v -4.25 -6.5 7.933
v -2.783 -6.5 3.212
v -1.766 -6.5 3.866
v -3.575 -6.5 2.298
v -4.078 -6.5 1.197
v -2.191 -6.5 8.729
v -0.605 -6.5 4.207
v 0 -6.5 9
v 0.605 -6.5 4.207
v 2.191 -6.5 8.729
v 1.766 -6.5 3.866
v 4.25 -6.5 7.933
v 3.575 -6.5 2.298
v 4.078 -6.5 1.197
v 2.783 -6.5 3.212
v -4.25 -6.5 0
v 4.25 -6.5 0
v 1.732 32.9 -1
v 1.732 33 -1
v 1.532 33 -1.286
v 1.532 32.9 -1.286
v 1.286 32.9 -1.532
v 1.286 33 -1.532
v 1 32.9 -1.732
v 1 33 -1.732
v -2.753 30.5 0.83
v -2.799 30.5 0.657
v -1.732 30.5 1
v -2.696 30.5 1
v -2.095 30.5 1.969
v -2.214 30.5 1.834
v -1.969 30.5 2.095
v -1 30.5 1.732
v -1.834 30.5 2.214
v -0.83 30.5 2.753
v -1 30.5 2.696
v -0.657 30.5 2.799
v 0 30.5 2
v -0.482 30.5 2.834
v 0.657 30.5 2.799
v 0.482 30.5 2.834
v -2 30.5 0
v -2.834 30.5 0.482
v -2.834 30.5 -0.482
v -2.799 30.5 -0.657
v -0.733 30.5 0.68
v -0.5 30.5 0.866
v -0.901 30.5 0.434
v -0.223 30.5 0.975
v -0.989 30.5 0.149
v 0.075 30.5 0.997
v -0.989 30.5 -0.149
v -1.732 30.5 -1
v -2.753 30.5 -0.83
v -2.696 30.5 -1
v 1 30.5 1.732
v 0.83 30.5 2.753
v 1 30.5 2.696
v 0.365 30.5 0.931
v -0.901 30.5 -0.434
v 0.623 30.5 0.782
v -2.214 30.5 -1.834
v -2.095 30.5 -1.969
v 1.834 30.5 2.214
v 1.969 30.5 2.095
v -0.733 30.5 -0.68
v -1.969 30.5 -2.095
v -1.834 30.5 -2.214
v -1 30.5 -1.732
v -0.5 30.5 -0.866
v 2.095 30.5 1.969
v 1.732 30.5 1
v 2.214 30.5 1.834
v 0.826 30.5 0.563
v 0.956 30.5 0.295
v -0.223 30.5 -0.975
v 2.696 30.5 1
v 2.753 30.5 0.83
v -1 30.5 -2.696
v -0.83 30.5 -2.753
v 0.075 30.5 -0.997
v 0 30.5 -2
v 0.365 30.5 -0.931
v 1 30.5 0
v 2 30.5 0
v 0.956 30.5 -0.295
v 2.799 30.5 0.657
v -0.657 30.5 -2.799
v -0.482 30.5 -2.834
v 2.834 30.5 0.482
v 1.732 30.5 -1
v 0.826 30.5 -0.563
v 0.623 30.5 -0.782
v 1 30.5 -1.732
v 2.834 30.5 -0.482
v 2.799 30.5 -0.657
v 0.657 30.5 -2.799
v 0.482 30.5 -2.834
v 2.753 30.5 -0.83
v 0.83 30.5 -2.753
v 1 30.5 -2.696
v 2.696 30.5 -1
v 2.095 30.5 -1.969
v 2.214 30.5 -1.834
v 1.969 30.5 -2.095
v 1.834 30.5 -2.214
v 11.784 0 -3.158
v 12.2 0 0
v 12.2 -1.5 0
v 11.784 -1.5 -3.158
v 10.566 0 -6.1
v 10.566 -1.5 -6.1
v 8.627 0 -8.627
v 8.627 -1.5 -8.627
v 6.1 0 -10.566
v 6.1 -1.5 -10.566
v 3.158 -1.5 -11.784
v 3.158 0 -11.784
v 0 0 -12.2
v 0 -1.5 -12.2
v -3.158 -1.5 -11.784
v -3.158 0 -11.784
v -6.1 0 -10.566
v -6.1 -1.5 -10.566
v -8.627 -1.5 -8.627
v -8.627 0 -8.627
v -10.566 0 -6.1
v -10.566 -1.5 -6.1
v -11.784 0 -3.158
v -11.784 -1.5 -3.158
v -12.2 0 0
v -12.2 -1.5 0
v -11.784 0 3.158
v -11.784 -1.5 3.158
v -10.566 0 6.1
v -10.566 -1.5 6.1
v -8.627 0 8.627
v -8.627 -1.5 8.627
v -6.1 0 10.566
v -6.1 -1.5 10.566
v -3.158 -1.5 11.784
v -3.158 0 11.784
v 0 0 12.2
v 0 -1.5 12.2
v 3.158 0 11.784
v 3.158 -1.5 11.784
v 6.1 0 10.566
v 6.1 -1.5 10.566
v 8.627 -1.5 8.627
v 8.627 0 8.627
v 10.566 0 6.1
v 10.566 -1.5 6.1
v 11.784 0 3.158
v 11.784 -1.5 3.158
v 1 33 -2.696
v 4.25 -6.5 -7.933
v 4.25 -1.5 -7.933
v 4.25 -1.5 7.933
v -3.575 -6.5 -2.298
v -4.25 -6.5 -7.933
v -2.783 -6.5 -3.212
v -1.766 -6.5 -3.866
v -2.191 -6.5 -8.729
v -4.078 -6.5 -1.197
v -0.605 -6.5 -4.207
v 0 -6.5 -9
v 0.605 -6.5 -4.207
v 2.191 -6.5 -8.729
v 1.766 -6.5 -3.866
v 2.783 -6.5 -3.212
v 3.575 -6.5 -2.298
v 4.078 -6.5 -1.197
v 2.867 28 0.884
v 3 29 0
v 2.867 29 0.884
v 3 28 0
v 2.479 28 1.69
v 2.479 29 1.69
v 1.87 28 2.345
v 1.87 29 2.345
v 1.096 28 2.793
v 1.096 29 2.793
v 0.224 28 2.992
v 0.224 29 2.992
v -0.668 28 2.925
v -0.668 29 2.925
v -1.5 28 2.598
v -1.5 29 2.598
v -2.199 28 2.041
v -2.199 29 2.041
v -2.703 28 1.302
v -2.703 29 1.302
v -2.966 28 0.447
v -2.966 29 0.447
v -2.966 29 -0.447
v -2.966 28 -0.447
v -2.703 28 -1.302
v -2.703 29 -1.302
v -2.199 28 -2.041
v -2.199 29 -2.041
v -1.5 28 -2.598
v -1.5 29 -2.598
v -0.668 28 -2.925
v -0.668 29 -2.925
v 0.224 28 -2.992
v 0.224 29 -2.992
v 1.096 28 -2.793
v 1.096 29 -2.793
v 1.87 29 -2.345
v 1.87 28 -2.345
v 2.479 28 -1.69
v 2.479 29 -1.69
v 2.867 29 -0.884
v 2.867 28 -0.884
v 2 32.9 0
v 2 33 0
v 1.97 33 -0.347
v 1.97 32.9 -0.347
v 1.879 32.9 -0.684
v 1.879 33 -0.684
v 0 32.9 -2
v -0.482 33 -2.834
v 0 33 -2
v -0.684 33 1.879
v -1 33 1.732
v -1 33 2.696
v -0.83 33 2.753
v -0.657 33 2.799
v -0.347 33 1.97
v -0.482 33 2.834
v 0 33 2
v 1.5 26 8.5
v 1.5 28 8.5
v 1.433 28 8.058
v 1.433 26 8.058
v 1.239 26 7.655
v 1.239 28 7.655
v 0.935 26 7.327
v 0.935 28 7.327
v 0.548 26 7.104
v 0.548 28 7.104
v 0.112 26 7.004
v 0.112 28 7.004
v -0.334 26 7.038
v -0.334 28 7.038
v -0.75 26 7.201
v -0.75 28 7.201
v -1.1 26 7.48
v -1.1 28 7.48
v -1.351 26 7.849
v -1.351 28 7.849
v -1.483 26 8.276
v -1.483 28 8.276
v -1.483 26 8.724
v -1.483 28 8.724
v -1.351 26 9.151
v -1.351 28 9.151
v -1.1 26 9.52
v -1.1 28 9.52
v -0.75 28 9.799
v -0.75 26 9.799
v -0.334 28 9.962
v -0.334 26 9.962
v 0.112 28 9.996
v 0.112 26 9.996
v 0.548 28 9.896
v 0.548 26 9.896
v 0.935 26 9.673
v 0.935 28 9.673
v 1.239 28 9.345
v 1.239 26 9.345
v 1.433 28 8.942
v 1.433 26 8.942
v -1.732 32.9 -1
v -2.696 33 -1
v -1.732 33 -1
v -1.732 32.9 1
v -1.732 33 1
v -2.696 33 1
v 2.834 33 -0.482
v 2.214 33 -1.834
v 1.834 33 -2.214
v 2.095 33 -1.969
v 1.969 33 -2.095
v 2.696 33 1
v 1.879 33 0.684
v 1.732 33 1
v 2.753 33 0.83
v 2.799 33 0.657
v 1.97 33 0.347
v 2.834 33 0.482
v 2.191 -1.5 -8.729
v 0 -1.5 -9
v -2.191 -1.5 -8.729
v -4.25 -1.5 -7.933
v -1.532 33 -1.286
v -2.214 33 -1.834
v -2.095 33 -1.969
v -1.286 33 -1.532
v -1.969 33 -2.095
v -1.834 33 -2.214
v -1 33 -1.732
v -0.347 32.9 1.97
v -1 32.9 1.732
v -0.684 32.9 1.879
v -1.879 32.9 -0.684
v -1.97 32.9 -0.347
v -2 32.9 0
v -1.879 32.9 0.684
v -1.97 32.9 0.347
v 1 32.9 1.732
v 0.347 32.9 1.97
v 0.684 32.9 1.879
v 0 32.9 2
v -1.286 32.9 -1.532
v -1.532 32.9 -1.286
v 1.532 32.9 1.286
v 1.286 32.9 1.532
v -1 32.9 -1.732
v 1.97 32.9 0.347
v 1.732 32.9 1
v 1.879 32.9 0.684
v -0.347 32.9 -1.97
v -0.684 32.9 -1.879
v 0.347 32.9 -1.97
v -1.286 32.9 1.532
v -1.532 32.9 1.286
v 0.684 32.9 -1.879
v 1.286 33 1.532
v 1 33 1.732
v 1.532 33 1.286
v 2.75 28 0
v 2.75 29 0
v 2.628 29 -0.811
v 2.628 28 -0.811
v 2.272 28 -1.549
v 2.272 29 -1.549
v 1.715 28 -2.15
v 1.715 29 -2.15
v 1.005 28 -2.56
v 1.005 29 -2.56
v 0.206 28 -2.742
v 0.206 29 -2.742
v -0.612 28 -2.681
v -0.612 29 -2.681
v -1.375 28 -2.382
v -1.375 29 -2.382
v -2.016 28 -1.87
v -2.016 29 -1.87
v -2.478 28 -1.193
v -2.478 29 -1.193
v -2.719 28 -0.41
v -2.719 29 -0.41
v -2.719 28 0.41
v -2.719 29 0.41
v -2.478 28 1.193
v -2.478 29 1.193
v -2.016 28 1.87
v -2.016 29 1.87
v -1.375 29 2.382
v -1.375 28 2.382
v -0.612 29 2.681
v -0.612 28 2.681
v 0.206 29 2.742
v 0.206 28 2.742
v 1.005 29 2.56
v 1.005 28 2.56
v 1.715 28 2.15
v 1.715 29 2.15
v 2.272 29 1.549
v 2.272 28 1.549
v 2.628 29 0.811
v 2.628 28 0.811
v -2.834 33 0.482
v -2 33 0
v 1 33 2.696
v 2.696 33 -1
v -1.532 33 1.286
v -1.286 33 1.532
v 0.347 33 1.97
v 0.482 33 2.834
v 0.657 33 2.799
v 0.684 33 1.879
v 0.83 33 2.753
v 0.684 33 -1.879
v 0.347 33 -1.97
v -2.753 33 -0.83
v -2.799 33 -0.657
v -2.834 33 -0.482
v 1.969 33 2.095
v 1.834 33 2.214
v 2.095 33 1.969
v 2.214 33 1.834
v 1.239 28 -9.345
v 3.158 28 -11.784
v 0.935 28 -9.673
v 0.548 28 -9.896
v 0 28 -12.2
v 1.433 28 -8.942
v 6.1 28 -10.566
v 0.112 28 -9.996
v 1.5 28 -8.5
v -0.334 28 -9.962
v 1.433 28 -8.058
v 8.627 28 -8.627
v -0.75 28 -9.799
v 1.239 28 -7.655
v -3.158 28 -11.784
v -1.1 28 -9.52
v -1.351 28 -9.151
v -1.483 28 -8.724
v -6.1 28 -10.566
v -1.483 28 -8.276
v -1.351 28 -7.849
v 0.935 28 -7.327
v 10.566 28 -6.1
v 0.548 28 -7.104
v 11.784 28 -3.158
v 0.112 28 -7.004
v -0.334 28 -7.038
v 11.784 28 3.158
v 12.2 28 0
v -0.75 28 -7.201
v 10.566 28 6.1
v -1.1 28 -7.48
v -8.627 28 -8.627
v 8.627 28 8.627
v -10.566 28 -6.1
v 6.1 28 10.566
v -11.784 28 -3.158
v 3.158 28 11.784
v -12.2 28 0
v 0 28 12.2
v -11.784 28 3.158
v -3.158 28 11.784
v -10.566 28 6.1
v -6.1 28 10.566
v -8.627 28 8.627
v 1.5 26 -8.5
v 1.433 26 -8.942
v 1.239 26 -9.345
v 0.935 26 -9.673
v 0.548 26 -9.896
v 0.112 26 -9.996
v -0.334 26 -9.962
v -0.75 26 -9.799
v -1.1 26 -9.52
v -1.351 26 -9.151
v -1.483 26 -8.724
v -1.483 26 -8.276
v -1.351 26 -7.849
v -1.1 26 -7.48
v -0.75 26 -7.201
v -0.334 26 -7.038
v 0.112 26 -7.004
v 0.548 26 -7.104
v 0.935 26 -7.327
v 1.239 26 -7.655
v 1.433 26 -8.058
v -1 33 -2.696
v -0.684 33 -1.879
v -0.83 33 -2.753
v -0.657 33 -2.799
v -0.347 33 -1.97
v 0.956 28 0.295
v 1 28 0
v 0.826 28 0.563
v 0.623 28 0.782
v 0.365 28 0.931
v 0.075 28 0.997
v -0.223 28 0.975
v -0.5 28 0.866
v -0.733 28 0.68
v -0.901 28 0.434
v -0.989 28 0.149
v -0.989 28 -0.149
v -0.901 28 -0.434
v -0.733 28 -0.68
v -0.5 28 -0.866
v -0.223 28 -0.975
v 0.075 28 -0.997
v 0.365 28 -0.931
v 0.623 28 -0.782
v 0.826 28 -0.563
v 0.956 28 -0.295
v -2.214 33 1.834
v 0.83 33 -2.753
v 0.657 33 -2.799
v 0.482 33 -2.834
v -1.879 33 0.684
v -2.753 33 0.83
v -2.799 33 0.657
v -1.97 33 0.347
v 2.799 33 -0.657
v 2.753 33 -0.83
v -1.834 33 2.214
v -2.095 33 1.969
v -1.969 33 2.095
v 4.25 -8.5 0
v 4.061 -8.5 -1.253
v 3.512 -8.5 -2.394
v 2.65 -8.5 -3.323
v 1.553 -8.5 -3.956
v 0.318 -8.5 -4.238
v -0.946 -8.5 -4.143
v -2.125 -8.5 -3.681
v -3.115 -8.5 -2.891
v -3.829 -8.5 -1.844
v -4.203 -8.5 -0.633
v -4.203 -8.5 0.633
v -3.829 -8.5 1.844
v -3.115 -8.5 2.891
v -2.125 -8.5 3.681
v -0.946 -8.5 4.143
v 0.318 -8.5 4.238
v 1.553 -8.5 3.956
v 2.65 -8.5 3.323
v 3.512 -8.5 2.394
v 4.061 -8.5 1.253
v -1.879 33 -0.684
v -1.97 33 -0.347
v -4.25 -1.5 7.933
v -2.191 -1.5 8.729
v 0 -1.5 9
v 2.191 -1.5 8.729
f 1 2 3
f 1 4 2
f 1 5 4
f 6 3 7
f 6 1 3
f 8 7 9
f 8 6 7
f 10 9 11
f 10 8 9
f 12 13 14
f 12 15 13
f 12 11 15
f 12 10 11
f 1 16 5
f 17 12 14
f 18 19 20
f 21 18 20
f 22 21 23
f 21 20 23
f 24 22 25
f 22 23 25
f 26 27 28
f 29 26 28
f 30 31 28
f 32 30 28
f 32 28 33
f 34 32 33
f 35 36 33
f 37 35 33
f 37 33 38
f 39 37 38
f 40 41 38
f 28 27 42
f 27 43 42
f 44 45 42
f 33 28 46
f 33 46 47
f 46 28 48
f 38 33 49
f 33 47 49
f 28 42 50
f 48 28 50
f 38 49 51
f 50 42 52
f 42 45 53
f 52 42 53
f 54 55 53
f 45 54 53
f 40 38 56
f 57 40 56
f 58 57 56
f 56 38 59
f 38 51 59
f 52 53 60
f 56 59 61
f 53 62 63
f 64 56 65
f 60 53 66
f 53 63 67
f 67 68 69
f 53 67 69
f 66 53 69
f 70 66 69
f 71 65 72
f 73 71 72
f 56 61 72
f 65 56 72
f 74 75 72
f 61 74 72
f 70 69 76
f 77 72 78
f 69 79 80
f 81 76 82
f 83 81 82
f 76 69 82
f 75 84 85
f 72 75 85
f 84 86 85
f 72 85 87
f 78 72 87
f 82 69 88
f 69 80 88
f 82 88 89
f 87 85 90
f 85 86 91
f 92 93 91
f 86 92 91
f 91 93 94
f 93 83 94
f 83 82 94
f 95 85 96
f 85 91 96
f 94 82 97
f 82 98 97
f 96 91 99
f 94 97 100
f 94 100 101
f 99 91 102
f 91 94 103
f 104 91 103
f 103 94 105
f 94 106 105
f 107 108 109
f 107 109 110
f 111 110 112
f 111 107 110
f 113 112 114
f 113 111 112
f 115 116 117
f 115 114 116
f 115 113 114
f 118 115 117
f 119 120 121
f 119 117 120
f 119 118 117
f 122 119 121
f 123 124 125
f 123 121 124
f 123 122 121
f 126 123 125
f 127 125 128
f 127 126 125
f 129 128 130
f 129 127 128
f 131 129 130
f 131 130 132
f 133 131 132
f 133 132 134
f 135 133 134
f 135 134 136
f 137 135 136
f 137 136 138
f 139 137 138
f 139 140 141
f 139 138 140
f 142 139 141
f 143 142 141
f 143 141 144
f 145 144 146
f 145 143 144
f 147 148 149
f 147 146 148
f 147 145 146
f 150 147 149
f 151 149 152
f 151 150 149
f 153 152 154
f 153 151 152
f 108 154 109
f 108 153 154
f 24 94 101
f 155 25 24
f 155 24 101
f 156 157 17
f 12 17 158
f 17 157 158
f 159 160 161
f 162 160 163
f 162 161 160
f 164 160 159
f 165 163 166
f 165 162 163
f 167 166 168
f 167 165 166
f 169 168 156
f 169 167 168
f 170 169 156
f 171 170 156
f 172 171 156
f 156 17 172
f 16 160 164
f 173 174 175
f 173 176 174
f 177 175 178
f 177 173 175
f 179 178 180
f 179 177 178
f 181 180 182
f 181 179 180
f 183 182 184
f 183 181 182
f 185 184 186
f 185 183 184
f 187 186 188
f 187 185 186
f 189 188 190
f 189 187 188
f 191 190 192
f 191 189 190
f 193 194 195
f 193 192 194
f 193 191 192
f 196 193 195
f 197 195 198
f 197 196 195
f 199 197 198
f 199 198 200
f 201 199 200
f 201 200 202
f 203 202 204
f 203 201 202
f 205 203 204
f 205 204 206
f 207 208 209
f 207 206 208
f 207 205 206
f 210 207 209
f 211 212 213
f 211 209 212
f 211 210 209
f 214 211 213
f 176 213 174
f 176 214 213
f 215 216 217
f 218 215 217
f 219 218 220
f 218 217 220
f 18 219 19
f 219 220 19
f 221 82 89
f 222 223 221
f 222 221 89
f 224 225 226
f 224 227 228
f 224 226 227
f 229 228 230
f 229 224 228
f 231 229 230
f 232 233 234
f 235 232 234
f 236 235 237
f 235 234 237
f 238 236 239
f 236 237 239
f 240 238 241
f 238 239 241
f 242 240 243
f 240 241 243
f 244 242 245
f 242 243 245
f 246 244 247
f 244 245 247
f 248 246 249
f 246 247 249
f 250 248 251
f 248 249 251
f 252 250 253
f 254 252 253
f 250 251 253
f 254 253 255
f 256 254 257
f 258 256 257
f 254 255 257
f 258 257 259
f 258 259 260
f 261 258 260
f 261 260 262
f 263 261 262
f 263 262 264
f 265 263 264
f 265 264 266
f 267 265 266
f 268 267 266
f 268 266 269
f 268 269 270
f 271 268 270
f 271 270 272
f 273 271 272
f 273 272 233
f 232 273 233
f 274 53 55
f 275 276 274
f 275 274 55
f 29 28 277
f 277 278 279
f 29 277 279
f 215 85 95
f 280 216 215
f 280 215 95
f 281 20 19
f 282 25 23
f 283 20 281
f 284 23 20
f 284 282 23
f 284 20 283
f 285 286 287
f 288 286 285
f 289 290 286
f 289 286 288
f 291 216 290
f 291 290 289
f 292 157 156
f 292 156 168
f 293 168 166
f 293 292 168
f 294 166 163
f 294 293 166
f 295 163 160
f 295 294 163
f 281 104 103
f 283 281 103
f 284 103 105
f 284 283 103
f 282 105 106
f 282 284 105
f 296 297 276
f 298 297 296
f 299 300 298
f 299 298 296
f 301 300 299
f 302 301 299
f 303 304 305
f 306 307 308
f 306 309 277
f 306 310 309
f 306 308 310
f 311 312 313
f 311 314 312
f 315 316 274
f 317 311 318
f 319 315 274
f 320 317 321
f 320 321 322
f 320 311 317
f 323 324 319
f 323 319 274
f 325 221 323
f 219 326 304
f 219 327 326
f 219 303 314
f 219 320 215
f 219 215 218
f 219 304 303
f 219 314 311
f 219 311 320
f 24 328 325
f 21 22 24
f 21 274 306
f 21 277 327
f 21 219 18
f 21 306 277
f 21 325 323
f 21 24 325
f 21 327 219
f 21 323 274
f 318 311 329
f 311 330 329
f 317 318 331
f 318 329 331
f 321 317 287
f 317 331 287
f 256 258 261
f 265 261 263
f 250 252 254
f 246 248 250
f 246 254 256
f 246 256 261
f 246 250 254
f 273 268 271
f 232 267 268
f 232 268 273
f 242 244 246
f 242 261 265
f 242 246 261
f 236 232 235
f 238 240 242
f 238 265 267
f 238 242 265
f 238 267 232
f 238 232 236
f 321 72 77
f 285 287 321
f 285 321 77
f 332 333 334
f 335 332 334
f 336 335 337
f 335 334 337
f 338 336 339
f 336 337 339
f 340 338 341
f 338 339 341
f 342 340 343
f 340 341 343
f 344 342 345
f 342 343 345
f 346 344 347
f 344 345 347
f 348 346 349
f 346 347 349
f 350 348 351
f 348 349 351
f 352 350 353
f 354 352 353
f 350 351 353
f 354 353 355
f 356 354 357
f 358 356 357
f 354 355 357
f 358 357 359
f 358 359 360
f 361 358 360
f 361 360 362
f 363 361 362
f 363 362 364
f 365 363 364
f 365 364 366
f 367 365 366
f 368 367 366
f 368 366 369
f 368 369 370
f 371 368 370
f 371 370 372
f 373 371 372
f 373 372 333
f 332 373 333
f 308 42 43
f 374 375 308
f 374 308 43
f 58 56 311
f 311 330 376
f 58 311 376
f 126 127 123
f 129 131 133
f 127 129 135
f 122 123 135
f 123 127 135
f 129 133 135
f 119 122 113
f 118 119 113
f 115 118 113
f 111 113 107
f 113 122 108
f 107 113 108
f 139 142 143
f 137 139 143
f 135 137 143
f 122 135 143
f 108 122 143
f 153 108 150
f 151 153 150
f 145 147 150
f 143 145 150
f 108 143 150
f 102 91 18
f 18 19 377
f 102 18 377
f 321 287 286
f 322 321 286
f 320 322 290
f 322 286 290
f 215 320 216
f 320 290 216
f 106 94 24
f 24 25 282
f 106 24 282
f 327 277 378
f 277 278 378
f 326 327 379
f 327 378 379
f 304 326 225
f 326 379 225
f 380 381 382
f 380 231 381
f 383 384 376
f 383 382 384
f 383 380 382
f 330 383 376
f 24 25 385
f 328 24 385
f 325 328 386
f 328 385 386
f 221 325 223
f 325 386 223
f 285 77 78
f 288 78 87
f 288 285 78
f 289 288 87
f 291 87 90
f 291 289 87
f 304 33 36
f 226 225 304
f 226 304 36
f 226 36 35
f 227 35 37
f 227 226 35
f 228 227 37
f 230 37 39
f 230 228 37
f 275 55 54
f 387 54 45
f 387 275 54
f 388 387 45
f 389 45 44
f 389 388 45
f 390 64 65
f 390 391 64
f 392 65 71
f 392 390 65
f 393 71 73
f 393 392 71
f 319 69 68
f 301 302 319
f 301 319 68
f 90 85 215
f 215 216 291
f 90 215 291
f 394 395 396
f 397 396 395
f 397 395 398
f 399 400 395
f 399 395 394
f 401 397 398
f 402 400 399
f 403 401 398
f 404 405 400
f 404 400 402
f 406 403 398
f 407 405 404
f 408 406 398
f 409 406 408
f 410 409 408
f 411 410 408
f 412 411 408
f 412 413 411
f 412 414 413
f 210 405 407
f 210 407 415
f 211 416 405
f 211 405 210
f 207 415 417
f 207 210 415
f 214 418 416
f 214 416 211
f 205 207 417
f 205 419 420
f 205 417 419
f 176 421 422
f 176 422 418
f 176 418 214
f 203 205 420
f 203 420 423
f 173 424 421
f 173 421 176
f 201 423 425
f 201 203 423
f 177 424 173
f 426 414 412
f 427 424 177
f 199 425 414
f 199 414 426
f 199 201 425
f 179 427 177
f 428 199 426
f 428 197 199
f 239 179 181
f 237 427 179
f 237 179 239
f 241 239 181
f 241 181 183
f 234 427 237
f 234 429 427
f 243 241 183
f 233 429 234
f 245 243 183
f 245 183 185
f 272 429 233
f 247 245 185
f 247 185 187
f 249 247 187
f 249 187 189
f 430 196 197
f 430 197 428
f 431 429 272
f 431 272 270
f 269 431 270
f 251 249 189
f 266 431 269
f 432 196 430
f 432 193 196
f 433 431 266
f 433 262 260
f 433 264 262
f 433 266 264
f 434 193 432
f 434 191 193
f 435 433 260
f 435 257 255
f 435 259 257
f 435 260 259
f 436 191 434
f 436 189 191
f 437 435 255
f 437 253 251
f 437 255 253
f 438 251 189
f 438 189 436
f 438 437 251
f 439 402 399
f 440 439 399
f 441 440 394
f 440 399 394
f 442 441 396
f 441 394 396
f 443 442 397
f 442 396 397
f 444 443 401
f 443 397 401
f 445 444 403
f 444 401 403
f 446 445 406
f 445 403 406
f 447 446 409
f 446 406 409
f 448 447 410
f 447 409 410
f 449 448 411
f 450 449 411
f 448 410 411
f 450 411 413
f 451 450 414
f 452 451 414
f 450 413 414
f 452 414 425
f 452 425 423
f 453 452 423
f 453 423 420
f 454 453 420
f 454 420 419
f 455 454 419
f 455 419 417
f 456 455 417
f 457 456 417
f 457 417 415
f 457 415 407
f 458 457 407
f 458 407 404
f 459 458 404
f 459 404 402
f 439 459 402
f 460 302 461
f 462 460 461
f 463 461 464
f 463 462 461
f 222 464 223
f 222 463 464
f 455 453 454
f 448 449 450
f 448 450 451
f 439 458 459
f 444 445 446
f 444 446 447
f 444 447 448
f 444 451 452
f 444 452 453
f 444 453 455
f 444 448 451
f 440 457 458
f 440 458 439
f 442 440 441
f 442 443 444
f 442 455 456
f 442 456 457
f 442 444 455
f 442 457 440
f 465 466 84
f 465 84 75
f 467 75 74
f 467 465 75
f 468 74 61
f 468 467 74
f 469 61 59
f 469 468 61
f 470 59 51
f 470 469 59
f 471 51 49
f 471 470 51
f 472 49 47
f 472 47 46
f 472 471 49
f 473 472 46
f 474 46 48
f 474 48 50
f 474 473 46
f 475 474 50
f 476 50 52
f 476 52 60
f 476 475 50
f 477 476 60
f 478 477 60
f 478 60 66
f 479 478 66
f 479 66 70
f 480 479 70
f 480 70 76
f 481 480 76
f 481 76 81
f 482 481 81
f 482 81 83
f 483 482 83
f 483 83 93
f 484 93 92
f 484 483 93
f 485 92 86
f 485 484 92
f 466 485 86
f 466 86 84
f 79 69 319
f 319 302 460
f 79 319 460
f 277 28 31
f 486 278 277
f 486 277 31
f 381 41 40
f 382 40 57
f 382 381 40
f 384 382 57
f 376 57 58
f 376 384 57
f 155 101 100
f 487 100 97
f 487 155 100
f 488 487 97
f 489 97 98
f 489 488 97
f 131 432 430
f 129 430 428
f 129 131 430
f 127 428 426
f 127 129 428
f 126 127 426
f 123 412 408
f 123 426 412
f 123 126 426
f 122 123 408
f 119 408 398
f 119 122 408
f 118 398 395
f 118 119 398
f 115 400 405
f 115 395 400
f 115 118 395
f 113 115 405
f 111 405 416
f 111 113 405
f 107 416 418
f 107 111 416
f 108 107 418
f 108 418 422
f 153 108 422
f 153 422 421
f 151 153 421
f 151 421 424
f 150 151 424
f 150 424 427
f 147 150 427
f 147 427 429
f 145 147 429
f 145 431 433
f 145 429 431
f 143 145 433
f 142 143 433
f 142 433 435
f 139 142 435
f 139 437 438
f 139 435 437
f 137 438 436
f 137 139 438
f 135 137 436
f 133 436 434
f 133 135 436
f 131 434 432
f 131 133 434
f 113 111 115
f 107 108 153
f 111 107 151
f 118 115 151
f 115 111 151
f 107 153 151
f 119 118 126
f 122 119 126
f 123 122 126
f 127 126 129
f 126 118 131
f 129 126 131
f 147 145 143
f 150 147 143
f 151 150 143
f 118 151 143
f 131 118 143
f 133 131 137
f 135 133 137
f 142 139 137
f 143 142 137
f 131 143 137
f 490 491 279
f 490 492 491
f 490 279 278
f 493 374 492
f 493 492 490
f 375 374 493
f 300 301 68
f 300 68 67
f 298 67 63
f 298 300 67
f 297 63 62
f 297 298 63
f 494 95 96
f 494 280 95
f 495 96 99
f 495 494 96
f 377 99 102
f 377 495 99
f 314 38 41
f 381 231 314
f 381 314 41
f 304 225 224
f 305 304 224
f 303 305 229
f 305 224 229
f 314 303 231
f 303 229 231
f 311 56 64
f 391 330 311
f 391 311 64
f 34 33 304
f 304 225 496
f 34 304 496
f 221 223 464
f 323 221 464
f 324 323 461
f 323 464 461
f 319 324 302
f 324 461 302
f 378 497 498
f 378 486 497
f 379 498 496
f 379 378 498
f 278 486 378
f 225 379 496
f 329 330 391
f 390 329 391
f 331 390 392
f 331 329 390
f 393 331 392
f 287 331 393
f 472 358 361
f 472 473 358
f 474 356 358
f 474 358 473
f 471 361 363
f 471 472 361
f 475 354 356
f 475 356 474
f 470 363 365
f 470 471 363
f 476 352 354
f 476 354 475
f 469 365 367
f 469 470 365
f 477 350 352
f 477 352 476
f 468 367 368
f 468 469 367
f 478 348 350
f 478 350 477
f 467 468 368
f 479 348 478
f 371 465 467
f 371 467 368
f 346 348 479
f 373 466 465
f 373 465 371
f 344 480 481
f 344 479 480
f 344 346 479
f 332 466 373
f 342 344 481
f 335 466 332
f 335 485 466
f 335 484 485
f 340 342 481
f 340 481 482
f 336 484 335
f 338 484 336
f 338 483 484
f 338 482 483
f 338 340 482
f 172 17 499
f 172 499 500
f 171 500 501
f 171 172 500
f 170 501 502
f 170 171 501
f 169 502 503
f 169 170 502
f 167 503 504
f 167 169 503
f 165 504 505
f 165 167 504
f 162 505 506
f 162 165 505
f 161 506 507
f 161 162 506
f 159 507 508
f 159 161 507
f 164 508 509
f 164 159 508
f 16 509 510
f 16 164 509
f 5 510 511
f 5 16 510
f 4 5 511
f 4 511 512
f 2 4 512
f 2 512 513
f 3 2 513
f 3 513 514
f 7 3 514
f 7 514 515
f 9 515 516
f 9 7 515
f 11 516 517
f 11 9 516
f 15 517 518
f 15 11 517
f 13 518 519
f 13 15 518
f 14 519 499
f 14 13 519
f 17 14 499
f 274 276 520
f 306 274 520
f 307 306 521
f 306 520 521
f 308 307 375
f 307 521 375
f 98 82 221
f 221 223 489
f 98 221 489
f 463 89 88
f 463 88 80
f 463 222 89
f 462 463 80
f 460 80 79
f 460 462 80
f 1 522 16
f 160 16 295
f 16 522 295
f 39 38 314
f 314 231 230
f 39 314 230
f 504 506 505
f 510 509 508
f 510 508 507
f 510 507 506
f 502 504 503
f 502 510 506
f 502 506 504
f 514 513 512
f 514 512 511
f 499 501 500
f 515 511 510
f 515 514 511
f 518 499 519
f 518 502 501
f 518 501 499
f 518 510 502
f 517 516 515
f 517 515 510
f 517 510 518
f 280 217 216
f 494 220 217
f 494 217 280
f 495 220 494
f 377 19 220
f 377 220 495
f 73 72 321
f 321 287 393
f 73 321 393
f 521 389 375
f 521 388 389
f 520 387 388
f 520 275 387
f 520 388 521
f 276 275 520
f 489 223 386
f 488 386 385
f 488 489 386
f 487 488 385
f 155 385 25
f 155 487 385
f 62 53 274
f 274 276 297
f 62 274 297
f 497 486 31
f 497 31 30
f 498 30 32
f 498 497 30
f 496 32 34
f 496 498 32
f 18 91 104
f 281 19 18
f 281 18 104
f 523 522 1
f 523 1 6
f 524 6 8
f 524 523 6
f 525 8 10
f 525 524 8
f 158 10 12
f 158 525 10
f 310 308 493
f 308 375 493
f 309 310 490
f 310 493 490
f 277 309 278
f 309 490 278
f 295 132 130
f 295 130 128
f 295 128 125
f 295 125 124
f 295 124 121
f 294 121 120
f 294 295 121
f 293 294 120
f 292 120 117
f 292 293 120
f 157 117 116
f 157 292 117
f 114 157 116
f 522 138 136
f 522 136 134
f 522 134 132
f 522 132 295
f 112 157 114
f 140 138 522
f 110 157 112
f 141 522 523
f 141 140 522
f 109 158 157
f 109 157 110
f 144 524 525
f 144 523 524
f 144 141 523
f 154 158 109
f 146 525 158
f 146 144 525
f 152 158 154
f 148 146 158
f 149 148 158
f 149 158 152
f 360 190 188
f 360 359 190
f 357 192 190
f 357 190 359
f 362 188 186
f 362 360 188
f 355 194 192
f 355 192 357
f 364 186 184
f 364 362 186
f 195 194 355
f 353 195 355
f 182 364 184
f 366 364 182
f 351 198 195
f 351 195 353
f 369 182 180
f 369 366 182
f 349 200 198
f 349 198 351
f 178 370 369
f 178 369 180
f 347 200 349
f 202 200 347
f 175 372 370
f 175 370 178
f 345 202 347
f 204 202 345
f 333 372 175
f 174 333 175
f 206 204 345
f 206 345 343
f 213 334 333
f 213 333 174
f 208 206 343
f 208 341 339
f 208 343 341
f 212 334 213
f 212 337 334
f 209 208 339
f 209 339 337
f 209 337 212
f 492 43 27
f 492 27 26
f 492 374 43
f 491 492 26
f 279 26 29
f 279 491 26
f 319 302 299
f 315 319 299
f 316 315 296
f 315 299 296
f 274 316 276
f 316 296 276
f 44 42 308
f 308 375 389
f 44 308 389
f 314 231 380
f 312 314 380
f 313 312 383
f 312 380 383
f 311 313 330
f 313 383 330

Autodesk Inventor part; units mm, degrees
ref_plane "YZ Plane" through (0, 0, 0) normal (1, 0, 0) x (0, 1, 0)
ref_plane "XZ Plane" through (0, 0, 0) normal (0, 1, 0) x (-1, 0, 0)
ref_plane "XY Plane" through (0, 0, 0) normal (0, 0, 1) x (1, 0, 0)
sketch "Szkic1" plane through (0, 0, 0) normal (0, 1, 0) x (-1, 0, 0)
  circle A0 centre (0, 0) radius 12.2
  dimension "d0" = 24.4
extrude "Wyciągnięcie proste1" add sketch "Szkic1" along normal blind 28
sketch "Szkic2" plane through (0, 28, 0) normal (0, 1, 0) x (1, 0, 0)
  circle A0 centre (0, 0) radius 3
  dimension "d3" = 6
extrude "Wyciągnięcie proste2" add sketch "Szkic2" along normal blind 1
sketch "Szkic3" plane through (0, 29, 0) normal (0, 1, 0) x (1, 0, 0)
  circle A0 centre (0, 0) radius 2.75
  dimension "d6" = 5.5
extrude "Wyciągnięcie proste3" cut sketch "Szkic3" against normal blind 1
sketch "Szkic4" plane through (0, 28, 0) normal (0, 1, 0) x (1, 0, 0)
  circle A0 centre (0, 0) radius 1
  dimension "d9" = 2
extrude "Wyciągnięcie proste4" add sketch "Szkic4" along normal blind 5
sketch "Szkic5" plane through (0, 33, 0) normal (0, 1, 0) x (1, 0, 0)
  circle A0 centre (0, 0) radius 2.875
  dimension "d12" = 5.75
extrude "Wyciągnięcie proste5" add sketch "Szkic5" against normal blind 2.5
sketch "Szkic6" plane through (0, 33, 0) normal (0, 1, 0) x (1, 0, 0)
  circle A0 centre (0, 0) radius 2
  line L0 (0, 2) -> (-0.4817, 2.8344)
  circle A1 centre (0, 0) radius 2.875 projected
  line L1 (0, 2) -> (0, 2.875) construction
  line L2 (0, 2) -> (0.4817, 2.8344)
  arc A2 (0.4817, 2.8344) -> (-0.4817, 2.8344) centre (0, 0) ccw
  dimension "d15" = 4
  dimension "d16" = 30
  dimension "d24" = 30
extrude "Wyciągnięcie proste6" cut sketch "Szkic6" against normal blind 2.5 contours L0 A1 L2 picked at (0.2143, 2.5683)
sketch "Szkic7" plane through (0, 33, 0) normal (0, 1, 0) x (1, 0, 0)
  line L0 (-0.4817, 2.8344) -> (0, 2) projected
  circle A0 centre (0, 0) radius 2
extrude "Wyciągnięcie proste7" cut sketch "Szkic7" against normal blind 0.1
pattern_circular "Szyk kołowy1" count 12 over 360 about axis through (0, -10, 0) along (0, 1, 0) of "Wyciągnięcie proste6"
sketch "Szkic8" plane through (0, 28, 0) normal (0, 1, 0) x (1, 0, 0)
  circle A0 centre (0, -8.5) radius 1.5
  circle A1 centre (0, 8.5) radius 1.5
  point P0 (0, 0)
  dimension "d25" = 3
  dimension "d26" = 3
  dimension "d27" = 17
  dimension "d28" = 8.5
extrude "Wyciągnięcie proste8" cut sketch "Szkic8" against normal blind 2
sketch "Szkic9" plane through (0, 0, 0) normal (0, -1, 0) x (1, 0, 0)
  circle A0 centre (0, 0) radius 12.2
  dimension "d41" = 24.4
extrude "Wyciągnięcie proste9" add sketch "Szkic9" along normal blind 1.5 separate body
sketch "Szkic10" plane through (0, -1.5, 0) normal (0, -1, 0) x (1, 0, 0)
  line L0 (-4.25, -7.9333) -> (4.25, -7.9333)
  line L1 (4.25, -7.9333) -> (4.25, 7.9333)
  line L2 (4.25, 7.9333) -> (-4.25, 7.9333)
  line L3 (-4.25, 7.9333) -> (-4.25, -7.9333)
  circle A0 centre (0, 0) radius 9
  point P0 (4.25, -7.9333)
  dimension "d33" = 8.5
  dimension "d34" = 4.25
  dimension "d35" = 18
extrude "Wyciągnięcie proste10" add sketch "Szkic10" along normal blind 5 contours L3 L2 L1 L0 | L0 A0 | A0 L2 bodies 2
sketch "Szkic11" plane through (0, -6.5, 0) normal (0, -1, 0) x (1, 0, 0)
  circle A0 centre (0, 0) radius 4.25
  dimension "d38" = 8.5
extrude "Wyciągnięcie proste11" add sketch "Szkic11" along normal blind 2 bodies 2
properties part number "MOTOR_DETAL"
